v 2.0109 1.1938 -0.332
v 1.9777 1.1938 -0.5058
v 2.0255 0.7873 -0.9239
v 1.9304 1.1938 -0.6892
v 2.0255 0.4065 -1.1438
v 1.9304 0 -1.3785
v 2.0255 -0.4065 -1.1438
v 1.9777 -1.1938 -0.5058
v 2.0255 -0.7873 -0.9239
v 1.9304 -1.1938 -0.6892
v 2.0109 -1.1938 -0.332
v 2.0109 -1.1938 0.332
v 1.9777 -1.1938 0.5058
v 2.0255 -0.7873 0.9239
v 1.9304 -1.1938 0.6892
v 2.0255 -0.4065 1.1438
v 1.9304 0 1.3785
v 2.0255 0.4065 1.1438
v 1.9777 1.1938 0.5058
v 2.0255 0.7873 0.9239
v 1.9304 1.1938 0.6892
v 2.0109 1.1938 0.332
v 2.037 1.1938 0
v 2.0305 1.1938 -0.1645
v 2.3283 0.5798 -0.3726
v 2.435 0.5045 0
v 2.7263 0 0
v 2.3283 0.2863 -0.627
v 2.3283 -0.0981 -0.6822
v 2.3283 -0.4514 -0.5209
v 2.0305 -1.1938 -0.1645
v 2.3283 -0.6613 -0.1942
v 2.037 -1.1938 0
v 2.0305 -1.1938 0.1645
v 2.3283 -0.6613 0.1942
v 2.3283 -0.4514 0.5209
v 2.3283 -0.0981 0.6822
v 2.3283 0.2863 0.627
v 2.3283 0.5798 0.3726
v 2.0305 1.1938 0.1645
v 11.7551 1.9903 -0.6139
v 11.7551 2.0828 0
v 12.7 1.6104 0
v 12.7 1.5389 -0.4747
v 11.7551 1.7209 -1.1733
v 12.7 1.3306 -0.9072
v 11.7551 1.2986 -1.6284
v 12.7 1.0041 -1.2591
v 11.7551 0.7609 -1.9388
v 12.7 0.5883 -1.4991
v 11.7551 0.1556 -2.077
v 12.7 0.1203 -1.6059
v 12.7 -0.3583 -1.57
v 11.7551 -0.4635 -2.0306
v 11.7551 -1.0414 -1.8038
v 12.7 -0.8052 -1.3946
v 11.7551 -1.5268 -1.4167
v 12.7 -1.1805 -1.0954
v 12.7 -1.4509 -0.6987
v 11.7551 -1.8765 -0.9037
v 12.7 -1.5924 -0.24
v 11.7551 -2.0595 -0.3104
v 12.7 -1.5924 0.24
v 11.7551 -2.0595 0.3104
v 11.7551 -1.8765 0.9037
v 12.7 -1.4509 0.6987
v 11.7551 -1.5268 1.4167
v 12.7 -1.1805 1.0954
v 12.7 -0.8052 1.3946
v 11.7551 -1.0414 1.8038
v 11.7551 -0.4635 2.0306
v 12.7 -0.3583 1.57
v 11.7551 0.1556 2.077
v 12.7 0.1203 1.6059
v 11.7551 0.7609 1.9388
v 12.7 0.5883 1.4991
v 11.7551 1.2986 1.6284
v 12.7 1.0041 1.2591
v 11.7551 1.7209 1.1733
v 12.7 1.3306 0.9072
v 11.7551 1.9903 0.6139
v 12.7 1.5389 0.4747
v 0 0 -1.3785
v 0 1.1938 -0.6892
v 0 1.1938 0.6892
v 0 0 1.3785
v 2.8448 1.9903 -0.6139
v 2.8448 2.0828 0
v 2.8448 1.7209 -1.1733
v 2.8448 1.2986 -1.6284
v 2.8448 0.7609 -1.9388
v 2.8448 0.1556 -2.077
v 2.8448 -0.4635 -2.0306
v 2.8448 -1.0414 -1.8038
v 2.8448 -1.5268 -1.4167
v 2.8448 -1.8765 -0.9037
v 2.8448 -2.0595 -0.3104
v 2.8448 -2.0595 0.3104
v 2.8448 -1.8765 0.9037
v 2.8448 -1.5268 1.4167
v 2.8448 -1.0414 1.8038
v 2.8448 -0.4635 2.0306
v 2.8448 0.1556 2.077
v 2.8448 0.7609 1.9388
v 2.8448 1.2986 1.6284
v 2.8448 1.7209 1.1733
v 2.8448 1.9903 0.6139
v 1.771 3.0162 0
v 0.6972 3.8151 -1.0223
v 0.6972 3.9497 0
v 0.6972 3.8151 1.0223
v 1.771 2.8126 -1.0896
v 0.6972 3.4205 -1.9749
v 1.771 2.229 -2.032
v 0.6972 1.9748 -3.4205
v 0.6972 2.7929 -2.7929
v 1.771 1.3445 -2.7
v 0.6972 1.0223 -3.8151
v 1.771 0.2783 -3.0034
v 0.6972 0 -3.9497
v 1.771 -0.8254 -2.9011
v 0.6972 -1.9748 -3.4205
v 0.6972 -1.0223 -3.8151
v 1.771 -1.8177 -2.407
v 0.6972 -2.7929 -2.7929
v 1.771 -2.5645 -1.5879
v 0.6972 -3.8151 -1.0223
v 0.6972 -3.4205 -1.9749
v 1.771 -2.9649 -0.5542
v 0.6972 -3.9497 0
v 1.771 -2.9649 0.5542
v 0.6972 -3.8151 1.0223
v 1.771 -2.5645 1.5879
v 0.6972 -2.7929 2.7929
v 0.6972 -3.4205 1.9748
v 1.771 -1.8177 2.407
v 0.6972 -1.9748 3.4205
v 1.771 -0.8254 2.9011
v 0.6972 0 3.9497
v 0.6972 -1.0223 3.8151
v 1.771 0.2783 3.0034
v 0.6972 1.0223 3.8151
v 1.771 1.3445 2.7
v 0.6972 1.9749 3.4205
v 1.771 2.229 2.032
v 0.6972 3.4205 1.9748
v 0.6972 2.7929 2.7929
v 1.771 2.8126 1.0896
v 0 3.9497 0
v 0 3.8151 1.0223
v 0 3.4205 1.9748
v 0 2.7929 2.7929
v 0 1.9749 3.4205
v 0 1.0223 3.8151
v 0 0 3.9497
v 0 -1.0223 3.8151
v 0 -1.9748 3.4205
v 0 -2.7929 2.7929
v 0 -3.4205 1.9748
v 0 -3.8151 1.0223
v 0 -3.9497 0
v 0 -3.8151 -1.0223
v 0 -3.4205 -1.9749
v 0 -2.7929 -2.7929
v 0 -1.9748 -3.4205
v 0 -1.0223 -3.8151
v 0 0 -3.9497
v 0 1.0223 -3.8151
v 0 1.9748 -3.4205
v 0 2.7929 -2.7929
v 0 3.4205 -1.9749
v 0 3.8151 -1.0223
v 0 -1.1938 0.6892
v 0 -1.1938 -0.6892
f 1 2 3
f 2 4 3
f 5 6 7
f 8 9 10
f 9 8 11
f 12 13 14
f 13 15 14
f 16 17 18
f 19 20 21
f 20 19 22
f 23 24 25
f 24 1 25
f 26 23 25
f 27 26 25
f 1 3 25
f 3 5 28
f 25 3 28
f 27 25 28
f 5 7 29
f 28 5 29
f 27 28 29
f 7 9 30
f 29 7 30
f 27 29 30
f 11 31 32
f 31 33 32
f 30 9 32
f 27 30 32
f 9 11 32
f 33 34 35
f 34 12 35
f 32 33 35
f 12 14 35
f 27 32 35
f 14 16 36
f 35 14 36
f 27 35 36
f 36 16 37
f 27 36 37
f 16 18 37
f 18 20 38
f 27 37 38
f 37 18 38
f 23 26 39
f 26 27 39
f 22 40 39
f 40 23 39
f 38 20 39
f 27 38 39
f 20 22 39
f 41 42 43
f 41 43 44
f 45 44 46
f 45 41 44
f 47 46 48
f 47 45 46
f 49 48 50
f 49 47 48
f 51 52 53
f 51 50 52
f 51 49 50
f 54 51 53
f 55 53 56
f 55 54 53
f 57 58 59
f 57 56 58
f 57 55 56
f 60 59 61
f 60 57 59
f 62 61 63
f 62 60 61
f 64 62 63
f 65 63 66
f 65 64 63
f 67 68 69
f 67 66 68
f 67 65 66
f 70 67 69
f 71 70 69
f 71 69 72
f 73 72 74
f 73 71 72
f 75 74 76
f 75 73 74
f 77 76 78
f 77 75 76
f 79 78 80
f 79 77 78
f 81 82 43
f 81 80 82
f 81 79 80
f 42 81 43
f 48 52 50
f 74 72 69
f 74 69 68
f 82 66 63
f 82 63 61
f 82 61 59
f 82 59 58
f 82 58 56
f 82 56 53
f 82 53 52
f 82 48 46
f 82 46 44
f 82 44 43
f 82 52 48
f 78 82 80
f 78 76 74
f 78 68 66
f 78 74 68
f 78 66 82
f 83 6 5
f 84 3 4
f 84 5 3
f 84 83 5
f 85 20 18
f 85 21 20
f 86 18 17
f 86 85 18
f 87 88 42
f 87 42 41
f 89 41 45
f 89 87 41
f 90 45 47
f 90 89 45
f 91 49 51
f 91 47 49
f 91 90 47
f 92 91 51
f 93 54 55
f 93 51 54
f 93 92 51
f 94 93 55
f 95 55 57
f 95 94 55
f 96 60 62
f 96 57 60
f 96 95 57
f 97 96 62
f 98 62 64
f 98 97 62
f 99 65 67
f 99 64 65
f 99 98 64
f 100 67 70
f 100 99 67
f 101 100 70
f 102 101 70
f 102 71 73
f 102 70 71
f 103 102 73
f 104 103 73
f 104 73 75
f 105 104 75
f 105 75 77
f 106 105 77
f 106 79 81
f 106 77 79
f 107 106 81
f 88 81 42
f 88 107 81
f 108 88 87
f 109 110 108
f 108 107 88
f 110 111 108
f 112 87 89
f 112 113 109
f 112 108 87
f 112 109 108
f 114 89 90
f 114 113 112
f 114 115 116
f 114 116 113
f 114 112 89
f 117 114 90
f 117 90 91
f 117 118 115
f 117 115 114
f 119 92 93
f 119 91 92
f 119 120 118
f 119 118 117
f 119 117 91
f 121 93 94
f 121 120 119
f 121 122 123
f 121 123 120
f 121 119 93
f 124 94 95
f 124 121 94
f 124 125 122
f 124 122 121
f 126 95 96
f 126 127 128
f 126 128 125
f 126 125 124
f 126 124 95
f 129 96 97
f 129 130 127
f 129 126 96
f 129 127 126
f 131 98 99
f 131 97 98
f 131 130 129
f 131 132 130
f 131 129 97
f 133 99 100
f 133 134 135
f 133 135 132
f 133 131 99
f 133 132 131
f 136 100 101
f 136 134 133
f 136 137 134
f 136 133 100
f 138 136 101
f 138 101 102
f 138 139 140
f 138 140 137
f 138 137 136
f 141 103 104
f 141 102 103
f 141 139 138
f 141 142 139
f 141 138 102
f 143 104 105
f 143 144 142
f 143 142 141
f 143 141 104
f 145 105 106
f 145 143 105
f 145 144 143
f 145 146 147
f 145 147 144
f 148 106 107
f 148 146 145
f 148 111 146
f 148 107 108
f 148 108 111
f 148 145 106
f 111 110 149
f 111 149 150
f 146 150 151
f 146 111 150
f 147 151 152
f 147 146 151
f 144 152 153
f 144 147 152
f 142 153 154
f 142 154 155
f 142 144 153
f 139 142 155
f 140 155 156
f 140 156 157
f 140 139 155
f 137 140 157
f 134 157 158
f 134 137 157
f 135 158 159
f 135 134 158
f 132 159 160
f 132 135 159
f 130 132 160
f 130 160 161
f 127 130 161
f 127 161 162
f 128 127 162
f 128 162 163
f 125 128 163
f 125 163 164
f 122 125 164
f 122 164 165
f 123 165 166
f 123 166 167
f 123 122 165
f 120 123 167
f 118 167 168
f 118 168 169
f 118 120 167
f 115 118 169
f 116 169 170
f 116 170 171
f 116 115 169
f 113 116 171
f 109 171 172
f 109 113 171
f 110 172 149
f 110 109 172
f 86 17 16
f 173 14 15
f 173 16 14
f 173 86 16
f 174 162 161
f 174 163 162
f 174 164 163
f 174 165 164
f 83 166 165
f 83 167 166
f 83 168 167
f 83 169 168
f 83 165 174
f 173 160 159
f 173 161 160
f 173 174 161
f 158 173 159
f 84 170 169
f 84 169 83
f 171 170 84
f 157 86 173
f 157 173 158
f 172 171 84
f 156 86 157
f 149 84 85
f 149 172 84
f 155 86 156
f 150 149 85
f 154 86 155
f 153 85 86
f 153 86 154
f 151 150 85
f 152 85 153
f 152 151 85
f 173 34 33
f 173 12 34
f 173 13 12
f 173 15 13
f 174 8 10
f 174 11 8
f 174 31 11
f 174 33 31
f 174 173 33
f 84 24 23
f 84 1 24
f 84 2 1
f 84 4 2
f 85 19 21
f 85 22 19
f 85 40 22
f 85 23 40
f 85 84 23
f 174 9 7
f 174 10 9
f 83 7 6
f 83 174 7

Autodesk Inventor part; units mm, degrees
ref_plane "YZ Plane" through (0, 0, 0) normal (1, 0, 0) x (0, 1, 0)
ref_plane "XZ Plane" through (0, 0, 0) normal (0, 1, 0) x (-1, 0, 0)
sketch "Sketch1" plane through (0, 0, 0) normal (0, 0, 1) x (1, 0, 0)
  line L0 (12.7, 0) -> (12.7, 2.0828)
  line L1 (12.7, 2.0828) -> (4.8293, 2.0828)
  line L2 (4.8293, 2.0828) -> (2.8448, 2.0828)
  line L3 (0, 3.9497) -> (0, 1.3785)
  line L4 (0, 1.3785) -> (1.9304, 1.3785)
  line L5 (1.9304, 1.3785) -> (2.7263, 0)
  line L6 (2.7263, 0) -> (12.7, 0)
  line L7 (0, 3.9497) -> (0.6972, 3.9497)
  line L8 (0.6972, 3.9497) -> (2.8448, 2.0828)
  line L9 (2.8448, 2.0828) -> (2.8448, 2.0828)
  line L10 (4.8293, 2.0828) -> (2.8448, 2.0828) construction
  line L11 (2.8448, 2.0828) -> (2.8448, 2.0828)
  line L12 (-2.54, 0) -> (15.24, 0) projected
  line L13 (0, -0.7899) -> (0, 4.7396) projected
  dimension "d0" = 12.7
  dimension "d1" = 7.8707
  dimension "d2" = 1.9304
  dimension "d3" = 4.1656
  dimension "d6" = 2.8448
  dimension "d7" = 41
  dimension "d8" = 2.757
  dimension "d9" = 60
  dimension "d10" = 7.8994
  dimension "d11" = 4.1656
  dimension "d12" = 1.9845
revolve "Body" add sketch "Sketch1" angle 360 about axis through (2.7263, 0, 0) along (1, 0, 0) contours L6 L5 L4 L3 L7 L8 L2 L1 L0
sketch "Sketch2" plane through (0, 0, 0) normal (-1, 0, 0) x (0, 0, 1)
  circle A0 centre (0, 0) radius 1.3785 projected
  line L0 (0, -5.5296) -> (0, 5.5296) projected
  line L1 (-5.5296, 0) -> (5.5296, 0) projected
  line L2 (1.3785, 0) -> (0.6892, -1.1938)
  line L3 (0.6892, -1.1938) -> (-0.6892, -1.1938)
  line L4 (-0.6892, -1.1938) -> (-1.3785, 0)
  line L5 (-1.3785, 0) -> (-0.6892, 1.1938)
  line L6 (-0.6892, 1.1938) -> (0.6892, 1.1938)
  line L7 (0.6892, 1.1938) -> (1.3785, 0)
  point P0 (0, 1.3785)
extrude "Slot" add sketch "Sketch2" against normal up to next contours L7 A0 | A0 L2 | L6 L0 A0 | A0 L0 L3 | L0 L6 A0 | A0 L3 L0 | L4 A0 | A0 L5
thread "Thread" size "8-32 UNC" class "2A" standard "ANSI Unified Screw Threads" length 7.8707
chamfer "Chamfer1" distance 0.4724 distance2 0.9449 1 edges at (12.7, -2.0828, 0) measured on face at (12.7, -0.7994, 0.0552)
ref_plane "Work Plane1" through (104.775, 0, 0) normal (0, 0, -1) x (1, 0, 0)
equation "\"d15\" = GEL"
equation "\"d17\" = -0.5 * SPD + 0.5 * GD"
equation "\"d18\" = GUL"
equation "\"d0\" = NLG"
equation "\"d1\" = GEL"
equation "\"d2\" = INTI"
equation "\"d3\" = GD"
equation "\"d6\" = KOH"
equation "\"d7\" = 0.5 * SEWI"
equation "\"d8\" = 1.1547 * SW"
equation "\"d10\" = KOD"
equation "\"d11\" = BDM"
equation "\"d12\" = GAL"
equation "\"NLG\" = 12.7"
equation "\"INTI\" = 1.9304"
equation "\"GEL\" = 7.8707"
equation "\"GAL\" = 1.9845"
equation "\"KOH\" = 2.8448"
equation "\"KOD\" = 7.8994"
equation "\"GUL\" = 0.94488"
equation "\"SPD\" = 3.22072"
equation "\"BDM\" = NND"
equation "\"GD\" = NND"
equation "\"SEWI\" = 82deg"
equation "\"SW\" = 2.3876"
equation "\"TOA\" = 30deg"
equation "\"GD1\" = SPD"
equation "\"THREADDIA\" = 4.1656"
equation "\"HHPTC\" = 0.79375"
equation "\"NND\" = 4.1656"
equation "\"E0\" = 1.155 * SW"
properties part number "ANSI B18.3 - 8-32 UNC x 0.5" material "Steel, Mild"
